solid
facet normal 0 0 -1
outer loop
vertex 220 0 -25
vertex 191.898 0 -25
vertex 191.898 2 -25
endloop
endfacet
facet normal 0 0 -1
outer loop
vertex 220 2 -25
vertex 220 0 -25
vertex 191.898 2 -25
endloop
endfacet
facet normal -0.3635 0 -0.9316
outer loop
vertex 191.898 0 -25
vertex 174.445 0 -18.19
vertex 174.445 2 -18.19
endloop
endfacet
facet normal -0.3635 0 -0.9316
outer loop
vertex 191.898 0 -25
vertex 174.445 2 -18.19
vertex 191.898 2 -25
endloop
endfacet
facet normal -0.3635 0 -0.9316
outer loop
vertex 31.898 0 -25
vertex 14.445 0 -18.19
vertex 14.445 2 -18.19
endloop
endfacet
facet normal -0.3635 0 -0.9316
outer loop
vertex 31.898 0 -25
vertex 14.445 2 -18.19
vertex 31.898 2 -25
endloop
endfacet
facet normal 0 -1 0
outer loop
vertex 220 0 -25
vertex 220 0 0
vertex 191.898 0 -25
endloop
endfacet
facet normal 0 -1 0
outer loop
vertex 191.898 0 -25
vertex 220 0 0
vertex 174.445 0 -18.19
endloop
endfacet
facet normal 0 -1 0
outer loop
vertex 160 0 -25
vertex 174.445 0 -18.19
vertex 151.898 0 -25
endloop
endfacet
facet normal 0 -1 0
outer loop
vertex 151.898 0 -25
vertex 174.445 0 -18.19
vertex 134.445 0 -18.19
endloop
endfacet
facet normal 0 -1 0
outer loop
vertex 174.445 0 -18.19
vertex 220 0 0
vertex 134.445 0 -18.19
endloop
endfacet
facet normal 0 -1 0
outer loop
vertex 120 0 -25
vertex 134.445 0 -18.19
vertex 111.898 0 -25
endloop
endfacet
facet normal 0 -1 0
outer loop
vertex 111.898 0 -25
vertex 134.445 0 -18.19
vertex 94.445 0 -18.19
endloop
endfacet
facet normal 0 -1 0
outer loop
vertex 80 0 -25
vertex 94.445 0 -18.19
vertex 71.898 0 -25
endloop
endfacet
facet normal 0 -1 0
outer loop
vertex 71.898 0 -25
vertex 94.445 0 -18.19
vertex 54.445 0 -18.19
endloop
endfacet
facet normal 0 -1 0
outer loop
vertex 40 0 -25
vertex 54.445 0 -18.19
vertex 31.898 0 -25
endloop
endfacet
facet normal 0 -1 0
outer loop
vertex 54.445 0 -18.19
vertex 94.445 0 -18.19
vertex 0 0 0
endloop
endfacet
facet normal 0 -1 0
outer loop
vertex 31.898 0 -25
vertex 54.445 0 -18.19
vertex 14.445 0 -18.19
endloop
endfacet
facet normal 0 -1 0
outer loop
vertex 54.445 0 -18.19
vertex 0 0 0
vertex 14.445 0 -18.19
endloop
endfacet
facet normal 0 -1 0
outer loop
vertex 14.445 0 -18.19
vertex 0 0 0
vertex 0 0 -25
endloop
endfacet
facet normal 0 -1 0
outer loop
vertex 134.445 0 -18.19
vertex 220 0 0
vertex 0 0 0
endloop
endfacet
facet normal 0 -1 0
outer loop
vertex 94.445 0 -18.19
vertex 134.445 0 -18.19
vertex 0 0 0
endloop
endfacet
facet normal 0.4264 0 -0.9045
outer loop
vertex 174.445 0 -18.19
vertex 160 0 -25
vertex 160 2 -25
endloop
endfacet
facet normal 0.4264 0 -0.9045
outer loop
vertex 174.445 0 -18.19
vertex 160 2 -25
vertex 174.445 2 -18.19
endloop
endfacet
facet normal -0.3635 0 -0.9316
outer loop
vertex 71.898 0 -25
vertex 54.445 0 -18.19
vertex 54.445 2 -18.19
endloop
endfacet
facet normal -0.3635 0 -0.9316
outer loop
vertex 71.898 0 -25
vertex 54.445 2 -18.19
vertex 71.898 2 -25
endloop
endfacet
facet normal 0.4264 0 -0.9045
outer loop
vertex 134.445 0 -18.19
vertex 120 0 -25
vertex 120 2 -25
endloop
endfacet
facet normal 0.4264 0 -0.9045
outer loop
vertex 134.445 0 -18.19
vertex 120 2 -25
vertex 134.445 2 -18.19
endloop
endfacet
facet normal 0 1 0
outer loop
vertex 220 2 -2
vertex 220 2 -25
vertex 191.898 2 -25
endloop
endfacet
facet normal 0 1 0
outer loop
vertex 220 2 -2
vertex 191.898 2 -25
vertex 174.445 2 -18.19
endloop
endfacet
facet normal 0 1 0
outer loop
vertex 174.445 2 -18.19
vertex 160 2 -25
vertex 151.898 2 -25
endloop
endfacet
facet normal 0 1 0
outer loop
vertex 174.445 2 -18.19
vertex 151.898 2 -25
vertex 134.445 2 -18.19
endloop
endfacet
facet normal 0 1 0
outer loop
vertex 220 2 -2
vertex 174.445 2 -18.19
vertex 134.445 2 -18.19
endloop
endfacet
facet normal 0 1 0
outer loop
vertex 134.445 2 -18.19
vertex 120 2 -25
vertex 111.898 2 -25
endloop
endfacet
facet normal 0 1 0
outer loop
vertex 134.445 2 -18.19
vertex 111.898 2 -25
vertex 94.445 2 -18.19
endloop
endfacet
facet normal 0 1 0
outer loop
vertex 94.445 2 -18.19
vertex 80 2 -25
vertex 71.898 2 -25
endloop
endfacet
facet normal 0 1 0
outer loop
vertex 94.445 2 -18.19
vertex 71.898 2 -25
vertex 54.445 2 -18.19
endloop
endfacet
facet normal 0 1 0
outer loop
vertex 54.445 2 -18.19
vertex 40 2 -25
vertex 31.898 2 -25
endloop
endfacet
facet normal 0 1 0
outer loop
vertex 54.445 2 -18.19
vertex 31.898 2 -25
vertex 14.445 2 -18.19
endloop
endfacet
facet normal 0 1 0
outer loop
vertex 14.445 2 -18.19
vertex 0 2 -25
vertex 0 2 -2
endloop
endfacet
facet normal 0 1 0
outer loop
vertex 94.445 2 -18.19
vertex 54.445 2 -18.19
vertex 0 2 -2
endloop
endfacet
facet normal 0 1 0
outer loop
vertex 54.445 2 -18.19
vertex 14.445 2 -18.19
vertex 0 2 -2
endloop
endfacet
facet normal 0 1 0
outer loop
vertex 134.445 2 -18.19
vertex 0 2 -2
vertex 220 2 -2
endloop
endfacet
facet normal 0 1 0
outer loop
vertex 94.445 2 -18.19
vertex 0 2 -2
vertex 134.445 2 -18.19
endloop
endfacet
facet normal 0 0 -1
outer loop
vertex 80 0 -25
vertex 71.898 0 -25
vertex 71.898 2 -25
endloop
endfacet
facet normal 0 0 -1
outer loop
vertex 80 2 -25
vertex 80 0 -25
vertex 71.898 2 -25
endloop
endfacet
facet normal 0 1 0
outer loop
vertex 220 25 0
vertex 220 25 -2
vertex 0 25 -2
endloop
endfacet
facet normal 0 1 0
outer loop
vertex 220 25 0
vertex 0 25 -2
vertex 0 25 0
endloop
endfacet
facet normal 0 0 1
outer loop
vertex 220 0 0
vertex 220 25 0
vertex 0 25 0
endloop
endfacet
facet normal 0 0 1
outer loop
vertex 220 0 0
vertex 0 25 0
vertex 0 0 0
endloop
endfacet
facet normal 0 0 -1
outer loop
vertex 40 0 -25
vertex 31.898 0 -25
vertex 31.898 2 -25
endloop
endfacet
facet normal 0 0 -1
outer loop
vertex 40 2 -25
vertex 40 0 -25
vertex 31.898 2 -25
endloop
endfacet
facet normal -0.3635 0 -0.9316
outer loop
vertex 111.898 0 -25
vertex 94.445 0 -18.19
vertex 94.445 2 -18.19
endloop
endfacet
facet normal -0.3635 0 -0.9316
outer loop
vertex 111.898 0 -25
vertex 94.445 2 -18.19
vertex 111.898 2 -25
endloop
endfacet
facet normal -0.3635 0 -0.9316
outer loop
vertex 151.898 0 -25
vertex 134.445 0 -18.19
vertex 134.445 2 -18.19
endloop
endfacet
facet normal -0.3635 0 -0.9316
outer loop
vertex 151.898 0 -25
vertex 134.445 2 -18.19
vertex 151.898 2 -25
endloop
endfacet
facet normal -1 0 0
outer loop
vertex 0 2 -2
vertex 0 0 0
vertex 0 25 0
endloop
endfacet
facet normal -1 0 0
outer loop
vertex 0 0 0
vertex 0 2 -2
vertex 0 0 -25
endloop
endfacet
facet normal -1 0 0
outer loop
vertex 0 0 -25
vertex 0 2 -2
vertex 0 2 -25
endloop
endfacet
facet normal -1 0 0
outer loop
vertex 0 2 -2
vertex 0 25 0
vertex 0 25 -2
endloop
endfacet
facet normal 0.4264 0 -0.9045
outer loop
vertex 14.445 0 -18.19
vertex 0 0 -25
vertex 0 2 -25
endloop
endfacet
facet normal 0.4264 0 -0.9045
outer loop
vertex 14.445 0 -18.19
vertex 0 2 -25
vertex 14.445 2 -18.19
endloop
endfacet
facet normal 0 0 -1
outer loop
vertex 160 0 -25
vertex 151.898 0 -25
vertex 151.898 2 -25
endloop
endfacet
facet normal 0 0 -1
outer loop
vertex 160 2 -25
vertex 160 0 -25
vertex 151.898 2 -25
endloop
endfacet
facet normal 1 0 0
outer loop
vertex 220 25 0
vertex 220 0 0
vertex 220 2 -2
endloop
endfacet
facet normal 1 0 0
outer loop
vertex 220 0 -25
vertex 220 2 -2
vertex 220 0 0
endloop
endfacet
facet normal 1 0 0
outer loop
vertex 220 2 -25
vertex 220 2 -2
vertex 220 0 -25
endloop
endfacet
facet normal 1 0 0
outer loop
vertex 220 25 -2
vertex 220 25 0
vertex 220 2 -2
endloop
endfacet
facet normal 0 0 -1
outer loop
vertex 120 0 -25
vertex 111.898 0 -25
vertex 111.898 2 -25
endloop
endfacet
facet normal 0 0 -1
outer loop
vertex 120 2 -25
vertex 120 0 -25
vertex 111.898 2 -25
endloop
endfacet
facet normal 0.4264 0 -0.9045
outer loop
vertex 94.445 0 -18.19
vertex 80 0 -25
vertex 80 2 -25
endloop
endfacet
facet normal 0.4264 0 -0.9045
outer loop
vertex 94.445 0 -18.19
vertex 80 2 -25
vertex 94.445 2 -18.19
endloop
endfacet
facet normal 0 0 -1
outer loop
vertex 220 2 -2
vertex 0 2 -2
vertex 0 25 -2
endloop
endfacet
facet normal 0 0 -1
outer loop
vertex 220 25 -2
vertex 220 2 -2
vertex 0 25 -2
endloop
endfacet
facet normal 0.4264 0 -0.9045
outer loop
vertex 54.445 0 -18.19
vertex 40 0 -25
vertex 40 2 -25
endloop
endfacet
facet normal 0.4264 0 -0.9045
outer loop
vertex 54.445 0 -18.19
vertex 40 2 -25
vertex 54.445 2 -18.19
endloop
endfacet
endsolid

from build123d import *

# Parameters (mm, degrees)
EXTRUDE_1_DEPTH     = 220
CUT_EXTRUDE_1_DEPTH = 26


with BuildPart() as part:
    # Эскиз1 → Вытянуть-Тонкостенный1 (new body)
    with BuildSketch(Plane(origin=(0, 0, 0), x_dir=(0, 0, -1), z_dir=(1, 0, 0))):
        Polygon((0, 25), (0, 0), (25, 0), (25, 2), (2, 2), (2, 25), align=None)
    extrude(amount=EXTRUDE_1_DEPTH)

    # Эскиз3 → Вырез-Вытянуть1 (cut, through all)
    with BuildSketch(Plane.XZ):
        Polygon((0, -25), (14.444982857, -18.190263819), (31.898443386, -25), align=None)
        Polygon((40, -25), (54.444982857, -18.190263819), (71.898443386, -25), align=None)
        Polygon((80, -25), (94.444982857, -18.190263819), (111.898443386, -25), align=None)
        Polygon((120, -25), (134.444982857, -18.190263819), (151.898443386, -25), align=None)
        Polygon((160, -25), (174.444982857, -18.190263819), (191.898443386, -25), align=None)
    extrude(amount=-CUT_EXTRUDE_1_DEPTH, mode=Mode.SUBTRACT)


solid = part.part
